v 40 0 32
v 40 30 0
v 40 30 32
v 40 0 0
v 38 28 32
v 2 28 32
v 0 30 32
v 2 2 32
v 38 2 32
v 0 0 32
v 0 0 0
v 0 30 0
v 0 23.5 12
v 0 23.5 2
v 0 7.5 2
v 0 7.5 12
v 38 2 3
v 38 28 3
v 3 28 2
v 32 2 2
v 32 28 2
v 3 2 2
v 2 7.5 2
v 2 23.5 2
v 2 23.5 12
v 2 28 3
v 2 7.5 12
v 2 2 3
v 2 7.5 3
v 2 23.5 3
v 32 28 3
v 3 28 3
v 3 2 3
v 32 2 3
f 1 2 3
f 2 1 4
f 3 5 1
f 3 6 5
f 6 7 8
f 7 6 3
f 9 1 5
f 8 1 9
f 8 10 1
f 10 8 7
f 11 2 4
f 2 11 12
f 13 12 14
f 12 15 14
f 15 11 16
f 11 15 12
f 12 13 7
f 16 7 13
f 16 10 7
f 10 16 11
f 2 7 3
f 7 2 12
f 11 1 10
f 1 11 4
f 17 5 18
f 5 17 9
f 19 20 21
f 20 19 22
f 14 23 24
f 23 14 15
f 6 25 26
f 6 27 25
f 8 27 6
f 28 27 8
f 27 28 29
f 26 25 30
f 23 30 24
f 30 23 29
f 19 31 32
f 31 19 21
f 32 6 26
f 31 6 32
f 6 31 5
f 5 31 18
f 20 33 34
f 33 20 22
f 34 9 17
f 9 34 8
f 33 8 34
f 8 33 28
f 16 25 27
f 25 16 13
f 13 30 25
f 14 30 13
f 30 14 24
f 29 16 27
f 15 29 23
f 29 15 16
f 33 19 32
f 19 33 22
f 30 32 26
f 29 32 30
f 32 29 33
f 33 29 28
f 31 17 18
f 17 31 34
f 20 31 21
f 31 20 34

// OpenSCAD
//resolution
R=30;

//BOX

union(){
    difference (){
        difference (){
            cube(size=[40,30,32],$fn=R);
            translate([2,2,2])cube(size=[36,26,33],$fn=R);
        }
        //hole power
        translate([-1,7.5,2])cube(size=[8,16,10],$fn=R);
    }
    //inside support
    translate([2,2,2])cube(size=[1,26,1],$fn=R);
    translate([32,2,2])cube(size=[6,26,1],$fn=R);
}


//Cover
/*
translate([-2,-2,2])cube(size=[40,30,2],$fn=R);
cube(size=[36,26,2],$fn=R);
*/
